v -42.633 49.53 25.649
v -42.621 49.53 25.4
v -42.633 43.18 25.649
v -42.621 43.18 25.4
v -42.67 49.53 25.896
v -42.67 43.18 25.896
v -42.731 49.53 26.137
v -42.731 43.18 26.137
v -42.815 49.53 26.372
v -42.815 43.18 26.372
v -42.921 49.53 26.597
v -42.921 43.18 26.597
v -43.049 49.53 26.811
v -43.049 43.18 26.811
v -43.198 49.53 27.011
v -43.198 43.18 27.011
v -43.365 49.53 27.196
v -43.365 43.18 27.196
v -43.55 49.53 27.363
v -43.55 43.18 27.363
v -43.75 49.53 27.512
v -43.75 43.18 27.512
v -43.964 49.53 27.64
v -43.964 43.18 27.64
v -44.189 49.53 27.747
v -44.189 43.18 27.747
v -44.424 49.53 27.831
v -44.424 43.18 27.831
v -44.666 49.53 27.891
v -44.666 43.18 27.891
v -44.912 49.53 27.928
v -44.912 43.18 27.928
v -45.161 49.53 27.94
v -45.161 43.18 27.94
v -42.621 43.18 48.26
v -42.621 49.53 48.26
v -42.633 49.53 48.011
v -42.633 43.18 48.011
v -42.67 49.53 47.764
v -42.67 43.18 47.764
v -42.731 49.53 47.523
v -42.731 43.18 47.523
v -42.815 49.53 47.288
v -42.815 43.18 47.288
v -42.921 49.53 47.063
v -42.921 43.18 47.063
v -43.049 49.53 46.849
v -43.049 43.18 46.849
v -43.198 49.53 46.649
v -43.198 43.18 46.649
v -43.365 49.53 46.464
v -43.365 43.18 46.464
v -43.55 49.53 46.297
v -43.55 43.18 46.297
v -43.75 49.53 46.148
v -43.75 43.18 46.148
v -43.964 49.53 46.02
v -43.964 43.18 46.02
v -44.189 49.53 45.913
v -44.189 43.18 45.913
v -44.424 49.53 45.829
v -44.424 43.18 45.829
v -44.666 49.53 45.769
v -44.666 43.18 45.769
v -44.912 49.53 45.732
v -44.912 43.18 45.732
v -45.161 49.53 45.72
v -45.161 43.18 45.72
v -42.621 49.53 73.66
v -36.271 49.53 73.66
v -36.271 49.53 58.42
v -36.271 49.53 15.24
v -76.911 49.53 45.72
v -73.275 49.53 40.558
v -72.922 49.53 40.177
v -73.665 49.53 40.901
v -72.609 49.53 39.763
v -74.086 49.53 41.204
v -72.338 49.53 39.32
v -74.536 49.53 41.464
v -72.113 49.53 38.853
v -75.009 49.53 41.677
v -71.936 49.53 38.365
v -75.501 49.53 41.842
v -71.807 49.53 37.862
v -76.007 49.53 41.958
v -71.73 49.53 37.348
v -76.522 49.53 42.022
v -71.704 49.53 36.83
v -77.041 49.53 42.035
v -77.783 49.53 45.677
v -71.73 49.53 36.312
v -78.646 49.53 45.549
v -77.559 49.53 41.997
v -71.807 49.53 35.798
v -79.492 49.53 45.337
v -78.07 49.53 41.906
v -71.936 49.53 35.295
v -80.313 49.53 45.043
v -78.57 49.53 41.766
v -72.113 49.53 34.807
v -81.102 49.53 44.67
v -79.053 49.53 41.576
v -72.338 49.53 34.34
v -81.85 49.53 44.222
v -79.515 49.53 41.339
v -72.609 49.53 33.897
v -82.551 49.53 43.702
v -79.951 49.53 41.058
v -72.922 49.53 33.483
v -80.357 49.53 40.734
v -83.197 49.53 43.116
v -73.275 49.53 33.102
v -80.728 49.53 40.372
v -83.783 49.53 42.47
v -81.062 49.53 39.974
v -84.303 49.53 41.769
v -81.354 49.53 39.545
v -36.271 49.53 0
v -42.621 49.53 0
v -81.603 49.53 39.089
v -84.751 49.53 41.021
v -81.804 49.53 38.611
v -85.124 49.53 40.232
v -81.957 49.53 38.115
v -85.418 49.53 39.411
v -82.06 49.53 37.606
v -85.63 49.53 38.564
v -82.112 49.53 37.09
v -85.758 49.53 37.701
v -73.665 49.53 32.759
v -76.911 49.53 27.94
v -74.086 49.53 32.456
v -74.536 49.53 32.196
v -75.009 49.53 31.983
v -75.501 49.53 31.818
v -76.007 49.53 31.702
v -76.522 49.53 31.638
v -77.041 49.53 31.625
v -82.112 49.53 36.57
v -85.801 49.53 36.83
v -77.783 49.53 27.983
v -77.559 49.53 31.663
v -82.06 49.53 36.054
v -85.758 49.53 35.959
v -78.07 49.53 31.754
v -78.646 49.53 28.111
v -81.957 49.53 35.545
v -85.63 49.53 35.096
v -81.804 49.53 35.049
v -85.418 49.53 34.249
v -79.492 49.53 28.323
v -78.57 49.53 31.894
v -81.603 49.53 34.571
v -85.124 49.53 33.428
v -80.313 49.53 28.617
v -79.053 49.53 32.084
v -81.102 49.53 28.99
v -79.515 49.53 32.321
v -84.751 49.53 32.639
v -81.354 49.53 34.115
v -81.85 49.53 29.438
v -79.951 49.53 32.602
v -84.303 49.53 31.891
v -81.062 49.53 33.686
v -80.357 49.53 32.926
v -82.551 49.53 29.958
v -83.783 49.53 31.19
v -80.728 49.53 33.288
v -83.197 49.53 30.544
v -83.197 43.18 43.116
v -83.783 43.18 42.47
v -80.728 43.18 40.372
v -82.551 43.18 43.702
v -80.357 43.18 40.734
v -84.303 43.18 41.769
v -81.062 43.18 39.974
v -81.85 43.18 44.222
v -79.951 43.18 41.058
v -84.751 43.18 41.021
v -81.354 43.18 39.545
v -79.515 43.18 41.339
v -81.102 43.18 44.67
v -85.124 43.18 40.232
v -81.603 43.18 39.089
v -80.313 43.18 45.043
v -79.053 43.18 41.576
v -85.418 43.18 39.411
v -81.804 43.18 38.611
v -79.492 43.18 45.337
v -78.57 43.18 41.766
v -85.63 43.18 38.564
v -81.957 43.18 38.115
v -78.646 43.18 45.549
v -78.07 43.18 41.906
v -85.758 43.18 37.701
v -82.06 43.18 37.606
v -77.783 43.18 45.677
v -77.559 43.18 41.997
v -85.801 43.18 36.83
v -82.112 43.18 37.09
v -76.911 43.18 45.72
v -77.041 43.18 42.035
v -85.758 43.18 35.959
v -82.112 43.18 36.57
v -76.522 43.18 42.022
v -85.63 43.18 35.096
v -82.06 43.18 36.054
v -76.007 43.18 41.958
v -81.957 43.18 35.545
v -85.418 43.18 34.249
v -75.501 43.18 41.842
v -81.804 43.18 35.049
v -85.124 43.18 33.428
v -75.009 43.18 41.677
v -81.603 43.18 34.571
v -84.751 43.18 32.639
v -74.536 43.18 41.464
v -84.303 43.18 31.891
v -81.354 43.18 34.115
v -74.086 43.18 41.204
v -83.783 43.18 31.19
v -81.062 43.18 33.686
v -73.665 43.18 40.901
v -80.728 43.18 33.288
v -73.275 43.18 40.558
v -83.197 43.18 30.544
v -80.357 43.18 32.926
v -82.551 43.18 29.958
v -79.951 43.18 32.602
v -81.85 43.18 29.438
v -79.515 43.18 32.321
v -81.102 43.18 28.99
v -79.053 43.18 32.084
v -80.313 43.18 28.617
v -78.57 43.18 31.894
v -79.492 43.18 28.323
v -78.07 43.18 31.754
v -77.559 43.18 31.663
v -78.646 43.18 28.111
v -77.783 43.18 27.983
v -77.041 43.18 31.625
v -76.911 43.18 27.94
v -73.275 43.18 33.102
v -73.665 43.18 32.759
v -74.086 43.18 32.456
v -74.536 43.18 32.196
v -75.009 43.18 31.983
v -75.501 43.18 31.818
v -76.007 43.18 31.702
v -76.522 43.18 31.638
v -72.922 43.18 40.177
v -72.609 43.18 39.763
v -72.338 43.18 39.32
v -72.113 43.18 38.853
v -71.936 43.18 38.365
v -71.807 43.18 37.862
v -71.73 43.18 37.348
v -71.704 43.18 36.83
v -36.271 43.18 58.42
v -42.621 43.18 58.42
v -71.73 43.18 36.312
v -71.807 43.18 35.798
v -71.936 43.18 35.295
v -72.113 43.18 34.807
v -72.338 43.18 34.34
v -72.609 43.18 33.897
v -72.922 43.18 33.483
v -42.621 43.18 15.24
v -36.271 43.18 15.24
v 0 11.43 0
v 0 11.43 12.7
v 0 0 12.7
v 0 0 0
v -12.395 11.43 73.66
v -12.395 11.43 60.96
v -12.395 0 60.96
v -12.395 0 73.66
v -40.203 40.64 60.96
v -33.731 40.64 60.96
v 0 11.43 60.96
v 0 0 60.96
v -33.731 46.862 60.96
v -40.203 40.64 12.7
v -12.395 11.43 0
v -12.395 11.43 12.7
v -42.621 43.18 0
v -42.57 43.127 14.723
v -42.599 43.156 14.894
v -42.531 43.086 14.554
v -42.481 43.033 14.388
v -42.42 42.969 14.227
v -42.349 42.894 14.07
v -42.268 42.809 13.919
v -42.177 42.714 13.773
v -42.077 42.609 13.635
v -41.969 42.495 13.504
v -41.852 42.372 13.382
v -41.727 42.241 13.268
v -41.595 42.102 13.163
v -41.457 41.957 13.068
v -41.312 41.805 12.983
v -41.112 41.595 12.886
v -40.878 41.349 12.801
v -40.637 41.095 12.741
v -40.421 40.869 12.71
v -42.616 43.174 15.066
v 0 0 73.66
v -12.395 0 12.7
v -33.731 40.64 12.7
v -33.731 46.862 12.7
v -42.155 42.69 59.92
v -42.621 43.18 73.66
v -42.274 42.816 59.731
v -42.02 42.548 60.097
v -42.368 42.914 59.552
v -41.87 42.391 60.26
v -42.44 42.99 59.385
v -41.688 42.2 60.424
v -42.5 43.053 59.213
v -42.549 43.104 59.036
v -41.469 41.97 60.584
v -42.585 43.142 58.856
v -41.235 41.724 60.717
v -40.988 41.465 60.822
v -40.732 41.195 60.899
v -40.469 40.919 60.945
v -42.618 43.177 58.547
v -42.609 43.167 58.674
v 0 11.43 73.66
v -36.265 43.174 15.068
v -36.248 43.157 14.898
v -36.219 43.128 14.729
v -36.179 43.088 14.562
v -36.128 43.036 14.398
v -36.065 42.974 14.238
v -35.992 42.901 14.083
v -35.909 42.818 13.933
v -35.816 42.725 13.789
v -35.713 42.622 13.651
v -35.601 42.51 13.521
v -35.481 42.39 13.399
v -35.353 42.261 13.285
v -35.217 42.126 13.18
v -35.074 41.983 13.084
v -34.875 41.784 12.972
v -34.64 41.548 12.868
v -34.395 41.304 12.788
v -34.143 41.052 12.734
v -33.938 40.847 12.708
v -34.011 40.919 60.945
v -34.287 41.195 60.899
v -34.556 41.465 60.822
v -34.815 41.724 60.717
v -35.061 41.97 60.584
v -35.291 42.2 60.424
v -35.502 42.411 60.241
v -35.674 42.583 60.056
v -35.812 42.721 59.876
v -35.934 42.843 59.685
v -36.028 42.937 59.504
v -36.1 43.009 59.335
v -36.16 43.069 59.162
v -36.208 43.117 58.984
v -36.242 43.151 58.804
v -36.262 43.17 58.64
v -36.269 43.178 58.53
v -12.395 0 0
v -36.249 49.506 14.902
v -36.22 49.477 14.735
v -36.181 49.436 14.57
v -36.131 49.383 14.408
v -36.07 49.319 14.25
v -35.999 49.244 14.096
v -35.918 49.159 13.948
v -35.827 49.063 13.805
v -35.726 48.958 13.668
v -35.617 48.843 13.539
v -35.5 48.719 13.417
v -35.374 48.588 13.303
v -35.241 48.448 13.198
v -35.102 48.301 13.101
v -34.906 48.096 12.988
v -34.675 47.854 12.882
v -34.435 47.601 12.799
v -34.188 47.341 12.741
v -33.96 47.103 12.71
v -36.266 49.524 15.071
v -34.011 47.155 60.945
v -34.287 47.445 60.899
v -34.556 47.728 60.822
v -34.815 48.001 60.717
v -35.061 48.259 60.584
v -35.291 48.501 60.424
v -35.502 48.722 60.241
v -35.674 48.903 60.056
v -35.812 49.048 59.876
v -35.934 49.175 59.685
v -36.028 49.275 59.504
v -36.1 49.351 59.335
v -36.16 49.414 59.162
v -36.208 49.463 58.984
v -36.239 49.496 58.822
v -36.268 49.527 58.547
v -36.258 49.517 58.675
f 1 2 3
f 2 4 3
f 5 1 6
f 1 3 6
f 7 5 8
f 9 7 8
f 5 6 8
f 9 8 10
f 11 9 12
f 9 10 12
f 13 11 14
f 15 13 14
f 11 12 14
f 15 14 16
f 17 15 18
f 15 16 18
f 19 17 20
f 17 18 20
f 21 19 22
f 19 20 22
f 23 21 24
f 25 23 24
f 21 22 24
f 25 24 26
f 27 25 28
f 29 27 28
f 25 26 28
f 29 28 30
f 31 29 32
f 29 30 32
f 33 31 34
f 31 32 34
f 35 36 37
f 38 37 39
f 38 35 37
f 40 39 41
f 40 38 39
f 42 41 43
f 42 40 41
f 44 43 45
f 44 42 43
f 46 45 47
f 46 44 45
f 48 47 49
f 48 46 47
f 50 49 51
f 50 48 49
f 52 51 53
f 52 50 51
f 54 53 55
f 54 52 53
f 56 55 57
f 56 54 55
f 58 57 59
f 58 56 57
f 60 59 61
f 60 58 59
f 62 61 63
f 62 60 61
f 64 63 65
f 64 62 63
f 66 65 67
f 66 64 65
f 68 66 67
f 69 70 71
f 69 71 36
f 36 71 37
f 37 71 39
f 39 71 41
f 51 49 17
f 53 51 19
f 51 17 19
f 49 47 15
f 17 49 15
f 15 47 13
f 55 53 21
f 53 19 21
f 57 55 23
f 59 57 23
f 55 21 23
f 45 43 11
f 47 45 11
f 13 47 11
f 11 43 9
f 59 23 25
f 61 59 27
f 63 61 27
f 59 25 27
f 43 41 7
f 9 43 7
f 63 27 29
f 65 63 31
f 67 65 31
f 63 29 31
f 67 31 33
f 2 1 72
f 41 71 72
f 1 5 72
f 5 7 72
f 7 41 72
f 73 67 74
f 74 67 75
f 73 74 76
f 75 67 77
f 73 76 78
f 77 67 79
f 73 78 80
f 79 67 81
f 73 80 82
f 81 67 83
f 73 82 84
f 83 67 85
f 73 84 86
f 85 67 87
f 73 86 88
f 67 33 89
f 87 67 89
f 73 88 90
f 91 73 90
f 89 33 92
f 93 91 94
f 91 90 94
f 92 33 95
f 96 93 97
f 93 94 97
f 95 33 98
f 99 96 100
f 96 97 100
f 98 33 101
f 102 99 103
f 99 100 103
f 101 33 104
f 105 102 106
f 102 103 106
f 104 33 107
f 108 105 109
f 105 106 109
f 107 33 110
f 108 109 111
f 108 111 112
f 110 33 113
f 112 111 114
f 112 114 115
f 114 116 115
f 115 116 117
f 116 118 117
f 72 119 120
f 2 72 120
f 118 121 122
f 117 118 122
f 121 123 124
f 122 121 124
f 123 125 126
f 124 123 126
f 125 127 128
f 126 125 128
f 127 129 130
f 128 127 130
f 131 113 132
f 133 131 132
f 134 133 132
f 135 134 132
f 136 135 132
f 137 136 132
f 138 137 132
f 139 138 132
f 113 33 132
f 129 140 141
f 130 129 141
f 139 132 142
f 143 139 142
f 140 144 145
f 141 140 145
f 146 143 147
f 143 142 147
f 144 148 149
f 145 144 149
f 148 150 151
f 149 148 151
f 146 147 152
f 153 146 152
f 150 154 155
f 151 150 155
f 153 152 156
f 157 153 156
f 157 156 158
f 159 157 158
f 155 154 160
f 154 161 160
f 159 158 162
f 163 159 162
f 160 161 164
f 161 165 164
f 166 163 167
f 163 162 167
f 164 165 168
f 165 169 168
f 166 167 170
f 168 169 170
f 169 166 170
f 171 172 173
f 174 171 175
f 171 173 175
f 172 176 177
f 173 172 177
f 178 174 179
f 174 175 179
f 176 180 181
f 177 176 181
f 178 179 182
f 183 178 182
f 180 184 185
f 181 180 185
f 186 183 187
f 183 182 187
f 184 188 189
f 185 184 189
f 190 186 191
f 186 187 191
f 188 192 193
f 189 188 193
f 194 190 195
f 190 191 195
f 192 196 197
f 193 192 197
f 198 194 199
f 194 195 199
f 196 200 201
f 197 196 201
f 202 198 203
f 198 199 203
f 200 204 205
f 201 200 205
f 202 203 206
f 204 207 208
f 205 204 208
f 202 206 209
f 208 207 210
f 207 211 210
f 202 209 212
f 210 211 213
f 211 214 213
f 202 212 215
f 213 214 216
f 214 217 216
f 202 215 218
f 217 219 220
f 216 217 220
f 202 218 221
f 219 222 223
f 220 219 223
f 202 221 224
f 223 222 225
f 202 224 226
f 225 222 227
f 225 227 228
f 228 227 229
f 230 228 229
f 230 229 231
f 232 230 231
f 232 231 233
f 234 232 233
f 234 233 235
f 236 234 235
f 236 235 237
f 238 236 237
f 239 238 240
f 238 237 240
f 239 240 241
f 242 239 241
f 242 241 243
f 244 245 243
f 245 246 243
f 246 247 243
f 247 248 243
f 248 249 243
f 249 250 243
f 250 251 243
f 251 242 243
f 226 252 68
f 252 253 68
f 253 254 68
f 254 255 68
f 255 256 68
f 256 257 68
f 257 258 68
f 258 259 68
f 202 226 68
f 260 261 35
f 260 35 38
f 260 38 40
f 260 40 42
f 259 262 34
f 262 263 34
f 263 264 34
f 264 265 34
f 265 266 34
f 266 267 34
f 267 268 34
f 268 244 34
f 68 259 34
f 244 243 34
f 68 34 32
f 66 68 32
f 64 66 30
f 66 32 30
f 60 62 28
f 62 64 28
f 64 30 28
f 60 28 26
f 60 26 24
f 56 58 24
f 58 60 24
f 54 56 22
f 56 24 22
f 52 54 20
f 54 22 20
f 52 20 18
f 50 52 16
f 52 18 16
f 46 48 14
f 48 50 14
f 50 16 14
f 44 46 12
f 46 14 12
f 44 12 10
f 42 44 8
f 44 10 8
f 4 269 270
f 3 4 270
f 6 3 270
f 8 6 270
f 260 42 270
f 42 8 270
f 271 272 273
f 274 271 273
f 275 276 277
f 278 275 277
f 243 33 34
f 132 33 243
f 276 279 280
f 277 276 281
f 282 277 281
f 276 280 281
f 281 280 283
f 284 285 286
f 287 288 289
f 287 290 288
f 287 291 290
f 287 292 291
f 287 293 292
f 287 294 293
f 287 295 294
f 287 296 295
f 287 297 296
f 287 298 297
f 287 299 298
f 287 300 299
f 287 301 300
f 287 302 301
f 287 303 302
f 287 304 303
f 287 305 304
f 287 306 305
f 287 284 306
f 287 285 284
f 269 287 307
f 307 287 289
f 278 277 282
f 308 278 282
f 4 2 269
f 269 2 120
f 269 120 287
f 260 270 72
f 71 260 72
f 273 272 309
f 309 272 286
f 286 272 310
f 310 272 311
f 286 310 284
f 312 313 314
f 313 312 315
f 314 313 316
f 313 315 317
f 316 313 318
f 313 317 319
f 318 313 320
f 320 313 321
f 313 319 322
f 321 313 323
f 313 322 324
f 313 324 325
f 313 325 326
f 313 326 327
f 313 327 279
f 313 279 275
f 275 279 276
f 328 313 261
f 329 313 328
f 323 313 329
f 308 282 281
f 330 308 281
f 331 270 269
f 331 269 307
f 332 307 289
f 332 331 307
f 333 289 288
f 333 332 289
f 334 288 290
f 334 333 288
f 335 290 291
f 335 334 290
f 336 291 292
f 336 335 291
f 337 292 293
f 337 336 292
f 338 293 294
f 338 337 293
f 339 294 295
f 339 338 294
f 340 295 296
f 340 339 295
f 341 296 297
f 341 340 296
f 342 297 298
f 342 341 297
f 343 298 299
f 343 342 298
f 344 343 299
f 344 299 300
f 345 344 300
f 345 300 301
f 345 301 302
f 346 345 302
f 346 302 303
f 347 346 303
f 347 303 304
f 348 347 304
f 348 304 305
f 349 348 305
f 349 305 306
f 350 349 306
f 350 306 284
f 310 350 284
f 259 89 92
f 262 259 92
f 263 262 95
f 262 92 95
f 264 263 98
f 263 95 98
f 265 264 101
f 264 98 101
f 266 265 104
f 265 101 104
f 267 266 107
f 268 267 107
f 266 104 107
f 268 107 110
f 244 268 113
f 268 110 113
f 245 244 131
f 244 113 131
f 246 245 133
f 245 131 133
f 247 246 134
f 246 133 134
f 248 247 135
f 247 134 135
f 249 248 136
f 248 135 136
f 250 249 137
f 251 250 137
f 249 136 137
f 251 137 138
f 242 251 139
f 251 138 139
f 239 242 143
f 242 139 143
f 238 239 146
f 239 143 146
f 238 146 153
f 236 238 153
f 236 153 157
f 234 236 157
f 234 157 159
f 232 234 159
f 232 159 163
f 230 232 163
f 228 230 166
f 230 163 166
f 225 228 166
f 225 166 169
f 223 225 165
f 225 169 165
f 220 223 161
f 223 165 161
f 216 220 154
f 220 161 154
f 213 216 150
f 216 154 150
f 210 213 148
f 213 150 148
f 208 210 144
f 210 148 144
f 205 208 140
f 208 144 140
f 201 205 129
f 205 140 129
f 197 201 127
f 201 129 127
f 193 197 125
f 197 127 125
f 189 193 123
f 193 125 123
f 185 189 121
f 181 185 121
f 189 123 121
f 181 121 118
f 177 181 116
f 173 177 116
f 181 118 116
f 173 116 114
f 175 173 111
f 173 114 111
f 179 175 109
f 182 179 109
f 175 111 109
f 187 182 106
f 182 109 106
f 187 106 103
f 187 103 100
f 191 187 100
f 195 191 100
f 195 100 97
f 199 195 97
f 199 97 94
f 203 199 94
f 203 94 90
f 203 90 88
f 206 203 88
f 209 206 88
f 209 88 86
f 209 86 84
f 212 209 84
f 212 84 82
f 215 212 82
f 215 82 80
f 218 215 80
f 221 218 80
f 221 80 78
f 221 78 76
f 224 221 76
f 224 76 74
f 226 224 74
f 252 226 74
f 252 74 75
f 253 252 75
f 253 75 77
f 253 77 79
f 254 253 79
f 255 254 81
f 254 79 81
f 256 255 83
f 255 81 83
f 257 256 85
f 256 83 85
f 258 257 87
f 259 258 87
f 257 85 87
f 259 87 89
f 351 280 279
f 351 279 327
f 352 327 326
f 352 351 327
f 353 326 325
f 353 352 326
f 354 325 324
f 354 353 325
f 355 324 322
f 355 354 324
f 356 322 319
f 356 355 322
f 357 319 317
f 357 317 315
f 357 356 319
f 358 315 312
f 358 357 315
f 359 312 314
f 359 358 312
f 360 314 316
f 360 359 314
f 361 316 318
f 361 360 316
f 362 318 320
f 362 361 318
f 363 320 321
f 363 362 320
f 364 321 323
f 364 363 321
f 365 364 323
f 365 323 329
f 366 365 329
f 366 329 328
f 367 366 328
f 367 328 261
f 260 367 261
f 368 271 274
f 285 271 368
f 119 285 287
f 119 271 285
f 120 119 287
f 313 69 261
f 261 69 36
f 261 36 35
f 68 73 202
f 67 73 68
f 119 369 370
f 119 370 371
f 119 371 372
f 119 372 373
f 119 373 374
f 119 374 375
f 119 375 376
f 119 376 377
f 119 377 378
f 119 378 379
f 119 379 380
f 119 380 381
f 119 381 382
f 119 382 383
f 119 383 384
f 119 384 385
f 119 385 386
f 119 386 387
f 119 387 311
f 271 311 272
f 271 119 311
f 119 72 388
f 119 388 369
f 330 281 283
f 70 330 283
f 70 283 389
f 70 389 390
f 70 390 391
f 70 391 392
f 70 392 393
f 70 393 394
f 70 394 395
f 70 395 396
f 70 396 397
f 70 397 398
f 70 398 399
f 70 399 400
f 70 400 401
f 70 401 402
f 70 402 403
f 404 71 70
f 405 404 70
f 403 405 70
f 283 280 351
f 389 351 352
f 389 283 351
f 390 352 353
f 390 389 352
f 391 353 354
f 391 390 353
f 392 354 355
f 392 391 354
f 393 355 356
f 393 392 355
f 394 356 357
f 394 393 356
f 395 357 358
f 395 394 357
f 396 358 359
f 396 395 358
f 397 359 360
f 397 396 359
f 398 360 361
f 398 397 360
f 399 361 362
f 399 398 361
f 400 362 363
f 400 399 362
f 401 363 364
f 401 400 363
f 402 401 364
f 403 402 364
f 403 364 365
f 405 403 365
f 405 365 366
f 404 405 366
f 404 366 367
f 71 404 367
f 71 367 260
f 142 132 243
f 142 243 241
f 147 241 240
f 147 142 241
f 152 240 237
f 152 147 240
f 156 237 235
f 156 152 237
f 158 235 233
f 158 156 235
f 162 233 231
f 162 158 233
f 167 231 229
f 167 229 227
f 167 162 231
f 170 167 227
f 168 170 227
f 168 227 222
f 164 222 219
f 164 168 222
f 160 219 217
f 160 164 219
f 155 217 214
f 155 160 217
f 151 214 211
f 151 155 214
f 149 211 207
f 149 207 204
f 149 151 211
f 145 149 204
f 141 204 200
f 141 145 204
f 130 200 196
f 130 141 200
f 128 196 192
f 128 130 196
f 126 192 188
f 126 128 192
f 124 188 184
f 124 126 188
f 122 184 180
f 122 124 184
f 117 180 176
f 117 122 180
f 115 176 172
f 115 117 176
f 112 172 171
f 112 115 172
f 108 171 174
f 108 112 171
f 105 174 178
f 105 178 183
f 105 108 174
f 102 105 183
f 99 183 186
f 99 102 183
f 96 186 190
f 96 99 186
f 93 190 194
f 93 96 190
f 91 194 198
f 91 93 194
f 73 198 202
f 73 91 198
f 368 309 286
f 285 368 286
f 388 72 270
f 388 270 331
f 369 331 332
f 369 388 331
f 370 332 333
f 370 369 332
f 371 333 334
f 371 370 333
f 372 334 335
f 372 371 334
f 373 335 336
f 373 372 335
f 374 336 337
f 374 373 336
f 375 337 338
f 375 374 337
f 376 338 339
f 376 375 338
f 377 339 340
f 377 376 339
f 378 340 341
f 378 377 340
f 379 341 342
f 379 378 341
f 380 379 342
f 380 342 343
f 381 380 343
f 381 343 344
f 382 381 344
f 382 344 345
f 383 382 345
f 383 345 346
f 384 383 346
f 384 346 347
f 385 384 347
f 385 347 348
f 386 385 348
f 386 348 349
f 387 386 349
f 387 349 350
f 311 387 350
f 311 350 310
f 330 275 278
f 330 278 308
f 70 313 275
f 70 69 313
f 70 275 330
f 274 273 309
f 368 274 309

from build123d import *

# Parameters (mm, degrees)
BOSS_EXTRUDE1_DEPTH = 12.7
SKETCH2_W           = 6.35
SKETCH2_H           = 6.35
BOSS_EXTRUDE2_DEPTH = 48.26
BOSS_EXTRUDE3_DEPTH = 12.7
SKETCH4_R           = 5.207
BOSS_EXTRUDE4_DEPTH = 6.35
FILLET1_R           = 2.54


with BuildPart() as part:
    # Sketch1 → Boss-Extrude1 (new body)
    with BuildSketch(Plane.XY):
        Polygon((0, 0), (-12.3952, 0), (-12.3952, 11.43), (-42.6212, 43.18), (-42.6212, 49.53), (-36.2712, 49.53), (0, 11.43), align=None)
    extrude(amount=BOSS_EXTRUDE1_DEPTH)

    # Sketch2 → Boss-Extrude2 (add)
    with BuildSketch(Plane.XY.offset(12.7)):
        with Locations((-39.4462, 46.355)):
            Rectangle(SKETCH2_W, SKETCH2_H)
    extrude(amount=BOSS_EXTRUDE2_DEPTH)

    # Sketch3 → Boss-Extrude3 (add)
    with BuildSketch(Plane.XY.offset(60.96)):
        Polygon((-42.6212, 43.18), (-12.3952, 11.43), (-12.3952, 0), (0, 0), (0, 11.43), (-36.2712, 49.53), (-42.6212, 49.53), align=None)
    extrude(amount=BOSS_EXTRUDE3_DEPTH)

    # Sketch4 → Boss-Extrude4 (add)
    with BuildSketch(Plane(origin=(0, 49.53, 0), x_dir=(1, 0, 0), z_dir=(0, 1, 0))):
        with BuildLine():
            Line((-42.6212, -27.94), (-76.9112, -27.94))
            ThreePointArc((-76.9112, -27.94), (-85.8012, -36.83), (-76.9112, -45.72))
            Line((-76.9112, -45.72), (-42.6212, -45.72))
            Line((-42.6212, -45.72), (-42.6212, -27.94))
        make_face()
        with Locations((-76.9112, -36.83)):
            Circle(SKETCH4_R, mode=Mode.SUBTRACT)
    extrude(amount=-BOSS_EXTRUDE4_DEPTH)

    # Fillet1
    fillet1_edges = [part.edges().sort_by_distance(p)[0] for p in [
        (-39.4462, 43.18, 12.7),
        (-36.2712, 46.355, 12.7),
        (-39.4462, 43.18, 60.96),
        (-36.2712, 46.355, 60.96),
        (-42.6212, 46.355, 45.72),
        (-42.6212, 46.355, 27.94),
    ]]
    fillet(fillet1_edges, radius=FILLET1_R)


solid = part.part
